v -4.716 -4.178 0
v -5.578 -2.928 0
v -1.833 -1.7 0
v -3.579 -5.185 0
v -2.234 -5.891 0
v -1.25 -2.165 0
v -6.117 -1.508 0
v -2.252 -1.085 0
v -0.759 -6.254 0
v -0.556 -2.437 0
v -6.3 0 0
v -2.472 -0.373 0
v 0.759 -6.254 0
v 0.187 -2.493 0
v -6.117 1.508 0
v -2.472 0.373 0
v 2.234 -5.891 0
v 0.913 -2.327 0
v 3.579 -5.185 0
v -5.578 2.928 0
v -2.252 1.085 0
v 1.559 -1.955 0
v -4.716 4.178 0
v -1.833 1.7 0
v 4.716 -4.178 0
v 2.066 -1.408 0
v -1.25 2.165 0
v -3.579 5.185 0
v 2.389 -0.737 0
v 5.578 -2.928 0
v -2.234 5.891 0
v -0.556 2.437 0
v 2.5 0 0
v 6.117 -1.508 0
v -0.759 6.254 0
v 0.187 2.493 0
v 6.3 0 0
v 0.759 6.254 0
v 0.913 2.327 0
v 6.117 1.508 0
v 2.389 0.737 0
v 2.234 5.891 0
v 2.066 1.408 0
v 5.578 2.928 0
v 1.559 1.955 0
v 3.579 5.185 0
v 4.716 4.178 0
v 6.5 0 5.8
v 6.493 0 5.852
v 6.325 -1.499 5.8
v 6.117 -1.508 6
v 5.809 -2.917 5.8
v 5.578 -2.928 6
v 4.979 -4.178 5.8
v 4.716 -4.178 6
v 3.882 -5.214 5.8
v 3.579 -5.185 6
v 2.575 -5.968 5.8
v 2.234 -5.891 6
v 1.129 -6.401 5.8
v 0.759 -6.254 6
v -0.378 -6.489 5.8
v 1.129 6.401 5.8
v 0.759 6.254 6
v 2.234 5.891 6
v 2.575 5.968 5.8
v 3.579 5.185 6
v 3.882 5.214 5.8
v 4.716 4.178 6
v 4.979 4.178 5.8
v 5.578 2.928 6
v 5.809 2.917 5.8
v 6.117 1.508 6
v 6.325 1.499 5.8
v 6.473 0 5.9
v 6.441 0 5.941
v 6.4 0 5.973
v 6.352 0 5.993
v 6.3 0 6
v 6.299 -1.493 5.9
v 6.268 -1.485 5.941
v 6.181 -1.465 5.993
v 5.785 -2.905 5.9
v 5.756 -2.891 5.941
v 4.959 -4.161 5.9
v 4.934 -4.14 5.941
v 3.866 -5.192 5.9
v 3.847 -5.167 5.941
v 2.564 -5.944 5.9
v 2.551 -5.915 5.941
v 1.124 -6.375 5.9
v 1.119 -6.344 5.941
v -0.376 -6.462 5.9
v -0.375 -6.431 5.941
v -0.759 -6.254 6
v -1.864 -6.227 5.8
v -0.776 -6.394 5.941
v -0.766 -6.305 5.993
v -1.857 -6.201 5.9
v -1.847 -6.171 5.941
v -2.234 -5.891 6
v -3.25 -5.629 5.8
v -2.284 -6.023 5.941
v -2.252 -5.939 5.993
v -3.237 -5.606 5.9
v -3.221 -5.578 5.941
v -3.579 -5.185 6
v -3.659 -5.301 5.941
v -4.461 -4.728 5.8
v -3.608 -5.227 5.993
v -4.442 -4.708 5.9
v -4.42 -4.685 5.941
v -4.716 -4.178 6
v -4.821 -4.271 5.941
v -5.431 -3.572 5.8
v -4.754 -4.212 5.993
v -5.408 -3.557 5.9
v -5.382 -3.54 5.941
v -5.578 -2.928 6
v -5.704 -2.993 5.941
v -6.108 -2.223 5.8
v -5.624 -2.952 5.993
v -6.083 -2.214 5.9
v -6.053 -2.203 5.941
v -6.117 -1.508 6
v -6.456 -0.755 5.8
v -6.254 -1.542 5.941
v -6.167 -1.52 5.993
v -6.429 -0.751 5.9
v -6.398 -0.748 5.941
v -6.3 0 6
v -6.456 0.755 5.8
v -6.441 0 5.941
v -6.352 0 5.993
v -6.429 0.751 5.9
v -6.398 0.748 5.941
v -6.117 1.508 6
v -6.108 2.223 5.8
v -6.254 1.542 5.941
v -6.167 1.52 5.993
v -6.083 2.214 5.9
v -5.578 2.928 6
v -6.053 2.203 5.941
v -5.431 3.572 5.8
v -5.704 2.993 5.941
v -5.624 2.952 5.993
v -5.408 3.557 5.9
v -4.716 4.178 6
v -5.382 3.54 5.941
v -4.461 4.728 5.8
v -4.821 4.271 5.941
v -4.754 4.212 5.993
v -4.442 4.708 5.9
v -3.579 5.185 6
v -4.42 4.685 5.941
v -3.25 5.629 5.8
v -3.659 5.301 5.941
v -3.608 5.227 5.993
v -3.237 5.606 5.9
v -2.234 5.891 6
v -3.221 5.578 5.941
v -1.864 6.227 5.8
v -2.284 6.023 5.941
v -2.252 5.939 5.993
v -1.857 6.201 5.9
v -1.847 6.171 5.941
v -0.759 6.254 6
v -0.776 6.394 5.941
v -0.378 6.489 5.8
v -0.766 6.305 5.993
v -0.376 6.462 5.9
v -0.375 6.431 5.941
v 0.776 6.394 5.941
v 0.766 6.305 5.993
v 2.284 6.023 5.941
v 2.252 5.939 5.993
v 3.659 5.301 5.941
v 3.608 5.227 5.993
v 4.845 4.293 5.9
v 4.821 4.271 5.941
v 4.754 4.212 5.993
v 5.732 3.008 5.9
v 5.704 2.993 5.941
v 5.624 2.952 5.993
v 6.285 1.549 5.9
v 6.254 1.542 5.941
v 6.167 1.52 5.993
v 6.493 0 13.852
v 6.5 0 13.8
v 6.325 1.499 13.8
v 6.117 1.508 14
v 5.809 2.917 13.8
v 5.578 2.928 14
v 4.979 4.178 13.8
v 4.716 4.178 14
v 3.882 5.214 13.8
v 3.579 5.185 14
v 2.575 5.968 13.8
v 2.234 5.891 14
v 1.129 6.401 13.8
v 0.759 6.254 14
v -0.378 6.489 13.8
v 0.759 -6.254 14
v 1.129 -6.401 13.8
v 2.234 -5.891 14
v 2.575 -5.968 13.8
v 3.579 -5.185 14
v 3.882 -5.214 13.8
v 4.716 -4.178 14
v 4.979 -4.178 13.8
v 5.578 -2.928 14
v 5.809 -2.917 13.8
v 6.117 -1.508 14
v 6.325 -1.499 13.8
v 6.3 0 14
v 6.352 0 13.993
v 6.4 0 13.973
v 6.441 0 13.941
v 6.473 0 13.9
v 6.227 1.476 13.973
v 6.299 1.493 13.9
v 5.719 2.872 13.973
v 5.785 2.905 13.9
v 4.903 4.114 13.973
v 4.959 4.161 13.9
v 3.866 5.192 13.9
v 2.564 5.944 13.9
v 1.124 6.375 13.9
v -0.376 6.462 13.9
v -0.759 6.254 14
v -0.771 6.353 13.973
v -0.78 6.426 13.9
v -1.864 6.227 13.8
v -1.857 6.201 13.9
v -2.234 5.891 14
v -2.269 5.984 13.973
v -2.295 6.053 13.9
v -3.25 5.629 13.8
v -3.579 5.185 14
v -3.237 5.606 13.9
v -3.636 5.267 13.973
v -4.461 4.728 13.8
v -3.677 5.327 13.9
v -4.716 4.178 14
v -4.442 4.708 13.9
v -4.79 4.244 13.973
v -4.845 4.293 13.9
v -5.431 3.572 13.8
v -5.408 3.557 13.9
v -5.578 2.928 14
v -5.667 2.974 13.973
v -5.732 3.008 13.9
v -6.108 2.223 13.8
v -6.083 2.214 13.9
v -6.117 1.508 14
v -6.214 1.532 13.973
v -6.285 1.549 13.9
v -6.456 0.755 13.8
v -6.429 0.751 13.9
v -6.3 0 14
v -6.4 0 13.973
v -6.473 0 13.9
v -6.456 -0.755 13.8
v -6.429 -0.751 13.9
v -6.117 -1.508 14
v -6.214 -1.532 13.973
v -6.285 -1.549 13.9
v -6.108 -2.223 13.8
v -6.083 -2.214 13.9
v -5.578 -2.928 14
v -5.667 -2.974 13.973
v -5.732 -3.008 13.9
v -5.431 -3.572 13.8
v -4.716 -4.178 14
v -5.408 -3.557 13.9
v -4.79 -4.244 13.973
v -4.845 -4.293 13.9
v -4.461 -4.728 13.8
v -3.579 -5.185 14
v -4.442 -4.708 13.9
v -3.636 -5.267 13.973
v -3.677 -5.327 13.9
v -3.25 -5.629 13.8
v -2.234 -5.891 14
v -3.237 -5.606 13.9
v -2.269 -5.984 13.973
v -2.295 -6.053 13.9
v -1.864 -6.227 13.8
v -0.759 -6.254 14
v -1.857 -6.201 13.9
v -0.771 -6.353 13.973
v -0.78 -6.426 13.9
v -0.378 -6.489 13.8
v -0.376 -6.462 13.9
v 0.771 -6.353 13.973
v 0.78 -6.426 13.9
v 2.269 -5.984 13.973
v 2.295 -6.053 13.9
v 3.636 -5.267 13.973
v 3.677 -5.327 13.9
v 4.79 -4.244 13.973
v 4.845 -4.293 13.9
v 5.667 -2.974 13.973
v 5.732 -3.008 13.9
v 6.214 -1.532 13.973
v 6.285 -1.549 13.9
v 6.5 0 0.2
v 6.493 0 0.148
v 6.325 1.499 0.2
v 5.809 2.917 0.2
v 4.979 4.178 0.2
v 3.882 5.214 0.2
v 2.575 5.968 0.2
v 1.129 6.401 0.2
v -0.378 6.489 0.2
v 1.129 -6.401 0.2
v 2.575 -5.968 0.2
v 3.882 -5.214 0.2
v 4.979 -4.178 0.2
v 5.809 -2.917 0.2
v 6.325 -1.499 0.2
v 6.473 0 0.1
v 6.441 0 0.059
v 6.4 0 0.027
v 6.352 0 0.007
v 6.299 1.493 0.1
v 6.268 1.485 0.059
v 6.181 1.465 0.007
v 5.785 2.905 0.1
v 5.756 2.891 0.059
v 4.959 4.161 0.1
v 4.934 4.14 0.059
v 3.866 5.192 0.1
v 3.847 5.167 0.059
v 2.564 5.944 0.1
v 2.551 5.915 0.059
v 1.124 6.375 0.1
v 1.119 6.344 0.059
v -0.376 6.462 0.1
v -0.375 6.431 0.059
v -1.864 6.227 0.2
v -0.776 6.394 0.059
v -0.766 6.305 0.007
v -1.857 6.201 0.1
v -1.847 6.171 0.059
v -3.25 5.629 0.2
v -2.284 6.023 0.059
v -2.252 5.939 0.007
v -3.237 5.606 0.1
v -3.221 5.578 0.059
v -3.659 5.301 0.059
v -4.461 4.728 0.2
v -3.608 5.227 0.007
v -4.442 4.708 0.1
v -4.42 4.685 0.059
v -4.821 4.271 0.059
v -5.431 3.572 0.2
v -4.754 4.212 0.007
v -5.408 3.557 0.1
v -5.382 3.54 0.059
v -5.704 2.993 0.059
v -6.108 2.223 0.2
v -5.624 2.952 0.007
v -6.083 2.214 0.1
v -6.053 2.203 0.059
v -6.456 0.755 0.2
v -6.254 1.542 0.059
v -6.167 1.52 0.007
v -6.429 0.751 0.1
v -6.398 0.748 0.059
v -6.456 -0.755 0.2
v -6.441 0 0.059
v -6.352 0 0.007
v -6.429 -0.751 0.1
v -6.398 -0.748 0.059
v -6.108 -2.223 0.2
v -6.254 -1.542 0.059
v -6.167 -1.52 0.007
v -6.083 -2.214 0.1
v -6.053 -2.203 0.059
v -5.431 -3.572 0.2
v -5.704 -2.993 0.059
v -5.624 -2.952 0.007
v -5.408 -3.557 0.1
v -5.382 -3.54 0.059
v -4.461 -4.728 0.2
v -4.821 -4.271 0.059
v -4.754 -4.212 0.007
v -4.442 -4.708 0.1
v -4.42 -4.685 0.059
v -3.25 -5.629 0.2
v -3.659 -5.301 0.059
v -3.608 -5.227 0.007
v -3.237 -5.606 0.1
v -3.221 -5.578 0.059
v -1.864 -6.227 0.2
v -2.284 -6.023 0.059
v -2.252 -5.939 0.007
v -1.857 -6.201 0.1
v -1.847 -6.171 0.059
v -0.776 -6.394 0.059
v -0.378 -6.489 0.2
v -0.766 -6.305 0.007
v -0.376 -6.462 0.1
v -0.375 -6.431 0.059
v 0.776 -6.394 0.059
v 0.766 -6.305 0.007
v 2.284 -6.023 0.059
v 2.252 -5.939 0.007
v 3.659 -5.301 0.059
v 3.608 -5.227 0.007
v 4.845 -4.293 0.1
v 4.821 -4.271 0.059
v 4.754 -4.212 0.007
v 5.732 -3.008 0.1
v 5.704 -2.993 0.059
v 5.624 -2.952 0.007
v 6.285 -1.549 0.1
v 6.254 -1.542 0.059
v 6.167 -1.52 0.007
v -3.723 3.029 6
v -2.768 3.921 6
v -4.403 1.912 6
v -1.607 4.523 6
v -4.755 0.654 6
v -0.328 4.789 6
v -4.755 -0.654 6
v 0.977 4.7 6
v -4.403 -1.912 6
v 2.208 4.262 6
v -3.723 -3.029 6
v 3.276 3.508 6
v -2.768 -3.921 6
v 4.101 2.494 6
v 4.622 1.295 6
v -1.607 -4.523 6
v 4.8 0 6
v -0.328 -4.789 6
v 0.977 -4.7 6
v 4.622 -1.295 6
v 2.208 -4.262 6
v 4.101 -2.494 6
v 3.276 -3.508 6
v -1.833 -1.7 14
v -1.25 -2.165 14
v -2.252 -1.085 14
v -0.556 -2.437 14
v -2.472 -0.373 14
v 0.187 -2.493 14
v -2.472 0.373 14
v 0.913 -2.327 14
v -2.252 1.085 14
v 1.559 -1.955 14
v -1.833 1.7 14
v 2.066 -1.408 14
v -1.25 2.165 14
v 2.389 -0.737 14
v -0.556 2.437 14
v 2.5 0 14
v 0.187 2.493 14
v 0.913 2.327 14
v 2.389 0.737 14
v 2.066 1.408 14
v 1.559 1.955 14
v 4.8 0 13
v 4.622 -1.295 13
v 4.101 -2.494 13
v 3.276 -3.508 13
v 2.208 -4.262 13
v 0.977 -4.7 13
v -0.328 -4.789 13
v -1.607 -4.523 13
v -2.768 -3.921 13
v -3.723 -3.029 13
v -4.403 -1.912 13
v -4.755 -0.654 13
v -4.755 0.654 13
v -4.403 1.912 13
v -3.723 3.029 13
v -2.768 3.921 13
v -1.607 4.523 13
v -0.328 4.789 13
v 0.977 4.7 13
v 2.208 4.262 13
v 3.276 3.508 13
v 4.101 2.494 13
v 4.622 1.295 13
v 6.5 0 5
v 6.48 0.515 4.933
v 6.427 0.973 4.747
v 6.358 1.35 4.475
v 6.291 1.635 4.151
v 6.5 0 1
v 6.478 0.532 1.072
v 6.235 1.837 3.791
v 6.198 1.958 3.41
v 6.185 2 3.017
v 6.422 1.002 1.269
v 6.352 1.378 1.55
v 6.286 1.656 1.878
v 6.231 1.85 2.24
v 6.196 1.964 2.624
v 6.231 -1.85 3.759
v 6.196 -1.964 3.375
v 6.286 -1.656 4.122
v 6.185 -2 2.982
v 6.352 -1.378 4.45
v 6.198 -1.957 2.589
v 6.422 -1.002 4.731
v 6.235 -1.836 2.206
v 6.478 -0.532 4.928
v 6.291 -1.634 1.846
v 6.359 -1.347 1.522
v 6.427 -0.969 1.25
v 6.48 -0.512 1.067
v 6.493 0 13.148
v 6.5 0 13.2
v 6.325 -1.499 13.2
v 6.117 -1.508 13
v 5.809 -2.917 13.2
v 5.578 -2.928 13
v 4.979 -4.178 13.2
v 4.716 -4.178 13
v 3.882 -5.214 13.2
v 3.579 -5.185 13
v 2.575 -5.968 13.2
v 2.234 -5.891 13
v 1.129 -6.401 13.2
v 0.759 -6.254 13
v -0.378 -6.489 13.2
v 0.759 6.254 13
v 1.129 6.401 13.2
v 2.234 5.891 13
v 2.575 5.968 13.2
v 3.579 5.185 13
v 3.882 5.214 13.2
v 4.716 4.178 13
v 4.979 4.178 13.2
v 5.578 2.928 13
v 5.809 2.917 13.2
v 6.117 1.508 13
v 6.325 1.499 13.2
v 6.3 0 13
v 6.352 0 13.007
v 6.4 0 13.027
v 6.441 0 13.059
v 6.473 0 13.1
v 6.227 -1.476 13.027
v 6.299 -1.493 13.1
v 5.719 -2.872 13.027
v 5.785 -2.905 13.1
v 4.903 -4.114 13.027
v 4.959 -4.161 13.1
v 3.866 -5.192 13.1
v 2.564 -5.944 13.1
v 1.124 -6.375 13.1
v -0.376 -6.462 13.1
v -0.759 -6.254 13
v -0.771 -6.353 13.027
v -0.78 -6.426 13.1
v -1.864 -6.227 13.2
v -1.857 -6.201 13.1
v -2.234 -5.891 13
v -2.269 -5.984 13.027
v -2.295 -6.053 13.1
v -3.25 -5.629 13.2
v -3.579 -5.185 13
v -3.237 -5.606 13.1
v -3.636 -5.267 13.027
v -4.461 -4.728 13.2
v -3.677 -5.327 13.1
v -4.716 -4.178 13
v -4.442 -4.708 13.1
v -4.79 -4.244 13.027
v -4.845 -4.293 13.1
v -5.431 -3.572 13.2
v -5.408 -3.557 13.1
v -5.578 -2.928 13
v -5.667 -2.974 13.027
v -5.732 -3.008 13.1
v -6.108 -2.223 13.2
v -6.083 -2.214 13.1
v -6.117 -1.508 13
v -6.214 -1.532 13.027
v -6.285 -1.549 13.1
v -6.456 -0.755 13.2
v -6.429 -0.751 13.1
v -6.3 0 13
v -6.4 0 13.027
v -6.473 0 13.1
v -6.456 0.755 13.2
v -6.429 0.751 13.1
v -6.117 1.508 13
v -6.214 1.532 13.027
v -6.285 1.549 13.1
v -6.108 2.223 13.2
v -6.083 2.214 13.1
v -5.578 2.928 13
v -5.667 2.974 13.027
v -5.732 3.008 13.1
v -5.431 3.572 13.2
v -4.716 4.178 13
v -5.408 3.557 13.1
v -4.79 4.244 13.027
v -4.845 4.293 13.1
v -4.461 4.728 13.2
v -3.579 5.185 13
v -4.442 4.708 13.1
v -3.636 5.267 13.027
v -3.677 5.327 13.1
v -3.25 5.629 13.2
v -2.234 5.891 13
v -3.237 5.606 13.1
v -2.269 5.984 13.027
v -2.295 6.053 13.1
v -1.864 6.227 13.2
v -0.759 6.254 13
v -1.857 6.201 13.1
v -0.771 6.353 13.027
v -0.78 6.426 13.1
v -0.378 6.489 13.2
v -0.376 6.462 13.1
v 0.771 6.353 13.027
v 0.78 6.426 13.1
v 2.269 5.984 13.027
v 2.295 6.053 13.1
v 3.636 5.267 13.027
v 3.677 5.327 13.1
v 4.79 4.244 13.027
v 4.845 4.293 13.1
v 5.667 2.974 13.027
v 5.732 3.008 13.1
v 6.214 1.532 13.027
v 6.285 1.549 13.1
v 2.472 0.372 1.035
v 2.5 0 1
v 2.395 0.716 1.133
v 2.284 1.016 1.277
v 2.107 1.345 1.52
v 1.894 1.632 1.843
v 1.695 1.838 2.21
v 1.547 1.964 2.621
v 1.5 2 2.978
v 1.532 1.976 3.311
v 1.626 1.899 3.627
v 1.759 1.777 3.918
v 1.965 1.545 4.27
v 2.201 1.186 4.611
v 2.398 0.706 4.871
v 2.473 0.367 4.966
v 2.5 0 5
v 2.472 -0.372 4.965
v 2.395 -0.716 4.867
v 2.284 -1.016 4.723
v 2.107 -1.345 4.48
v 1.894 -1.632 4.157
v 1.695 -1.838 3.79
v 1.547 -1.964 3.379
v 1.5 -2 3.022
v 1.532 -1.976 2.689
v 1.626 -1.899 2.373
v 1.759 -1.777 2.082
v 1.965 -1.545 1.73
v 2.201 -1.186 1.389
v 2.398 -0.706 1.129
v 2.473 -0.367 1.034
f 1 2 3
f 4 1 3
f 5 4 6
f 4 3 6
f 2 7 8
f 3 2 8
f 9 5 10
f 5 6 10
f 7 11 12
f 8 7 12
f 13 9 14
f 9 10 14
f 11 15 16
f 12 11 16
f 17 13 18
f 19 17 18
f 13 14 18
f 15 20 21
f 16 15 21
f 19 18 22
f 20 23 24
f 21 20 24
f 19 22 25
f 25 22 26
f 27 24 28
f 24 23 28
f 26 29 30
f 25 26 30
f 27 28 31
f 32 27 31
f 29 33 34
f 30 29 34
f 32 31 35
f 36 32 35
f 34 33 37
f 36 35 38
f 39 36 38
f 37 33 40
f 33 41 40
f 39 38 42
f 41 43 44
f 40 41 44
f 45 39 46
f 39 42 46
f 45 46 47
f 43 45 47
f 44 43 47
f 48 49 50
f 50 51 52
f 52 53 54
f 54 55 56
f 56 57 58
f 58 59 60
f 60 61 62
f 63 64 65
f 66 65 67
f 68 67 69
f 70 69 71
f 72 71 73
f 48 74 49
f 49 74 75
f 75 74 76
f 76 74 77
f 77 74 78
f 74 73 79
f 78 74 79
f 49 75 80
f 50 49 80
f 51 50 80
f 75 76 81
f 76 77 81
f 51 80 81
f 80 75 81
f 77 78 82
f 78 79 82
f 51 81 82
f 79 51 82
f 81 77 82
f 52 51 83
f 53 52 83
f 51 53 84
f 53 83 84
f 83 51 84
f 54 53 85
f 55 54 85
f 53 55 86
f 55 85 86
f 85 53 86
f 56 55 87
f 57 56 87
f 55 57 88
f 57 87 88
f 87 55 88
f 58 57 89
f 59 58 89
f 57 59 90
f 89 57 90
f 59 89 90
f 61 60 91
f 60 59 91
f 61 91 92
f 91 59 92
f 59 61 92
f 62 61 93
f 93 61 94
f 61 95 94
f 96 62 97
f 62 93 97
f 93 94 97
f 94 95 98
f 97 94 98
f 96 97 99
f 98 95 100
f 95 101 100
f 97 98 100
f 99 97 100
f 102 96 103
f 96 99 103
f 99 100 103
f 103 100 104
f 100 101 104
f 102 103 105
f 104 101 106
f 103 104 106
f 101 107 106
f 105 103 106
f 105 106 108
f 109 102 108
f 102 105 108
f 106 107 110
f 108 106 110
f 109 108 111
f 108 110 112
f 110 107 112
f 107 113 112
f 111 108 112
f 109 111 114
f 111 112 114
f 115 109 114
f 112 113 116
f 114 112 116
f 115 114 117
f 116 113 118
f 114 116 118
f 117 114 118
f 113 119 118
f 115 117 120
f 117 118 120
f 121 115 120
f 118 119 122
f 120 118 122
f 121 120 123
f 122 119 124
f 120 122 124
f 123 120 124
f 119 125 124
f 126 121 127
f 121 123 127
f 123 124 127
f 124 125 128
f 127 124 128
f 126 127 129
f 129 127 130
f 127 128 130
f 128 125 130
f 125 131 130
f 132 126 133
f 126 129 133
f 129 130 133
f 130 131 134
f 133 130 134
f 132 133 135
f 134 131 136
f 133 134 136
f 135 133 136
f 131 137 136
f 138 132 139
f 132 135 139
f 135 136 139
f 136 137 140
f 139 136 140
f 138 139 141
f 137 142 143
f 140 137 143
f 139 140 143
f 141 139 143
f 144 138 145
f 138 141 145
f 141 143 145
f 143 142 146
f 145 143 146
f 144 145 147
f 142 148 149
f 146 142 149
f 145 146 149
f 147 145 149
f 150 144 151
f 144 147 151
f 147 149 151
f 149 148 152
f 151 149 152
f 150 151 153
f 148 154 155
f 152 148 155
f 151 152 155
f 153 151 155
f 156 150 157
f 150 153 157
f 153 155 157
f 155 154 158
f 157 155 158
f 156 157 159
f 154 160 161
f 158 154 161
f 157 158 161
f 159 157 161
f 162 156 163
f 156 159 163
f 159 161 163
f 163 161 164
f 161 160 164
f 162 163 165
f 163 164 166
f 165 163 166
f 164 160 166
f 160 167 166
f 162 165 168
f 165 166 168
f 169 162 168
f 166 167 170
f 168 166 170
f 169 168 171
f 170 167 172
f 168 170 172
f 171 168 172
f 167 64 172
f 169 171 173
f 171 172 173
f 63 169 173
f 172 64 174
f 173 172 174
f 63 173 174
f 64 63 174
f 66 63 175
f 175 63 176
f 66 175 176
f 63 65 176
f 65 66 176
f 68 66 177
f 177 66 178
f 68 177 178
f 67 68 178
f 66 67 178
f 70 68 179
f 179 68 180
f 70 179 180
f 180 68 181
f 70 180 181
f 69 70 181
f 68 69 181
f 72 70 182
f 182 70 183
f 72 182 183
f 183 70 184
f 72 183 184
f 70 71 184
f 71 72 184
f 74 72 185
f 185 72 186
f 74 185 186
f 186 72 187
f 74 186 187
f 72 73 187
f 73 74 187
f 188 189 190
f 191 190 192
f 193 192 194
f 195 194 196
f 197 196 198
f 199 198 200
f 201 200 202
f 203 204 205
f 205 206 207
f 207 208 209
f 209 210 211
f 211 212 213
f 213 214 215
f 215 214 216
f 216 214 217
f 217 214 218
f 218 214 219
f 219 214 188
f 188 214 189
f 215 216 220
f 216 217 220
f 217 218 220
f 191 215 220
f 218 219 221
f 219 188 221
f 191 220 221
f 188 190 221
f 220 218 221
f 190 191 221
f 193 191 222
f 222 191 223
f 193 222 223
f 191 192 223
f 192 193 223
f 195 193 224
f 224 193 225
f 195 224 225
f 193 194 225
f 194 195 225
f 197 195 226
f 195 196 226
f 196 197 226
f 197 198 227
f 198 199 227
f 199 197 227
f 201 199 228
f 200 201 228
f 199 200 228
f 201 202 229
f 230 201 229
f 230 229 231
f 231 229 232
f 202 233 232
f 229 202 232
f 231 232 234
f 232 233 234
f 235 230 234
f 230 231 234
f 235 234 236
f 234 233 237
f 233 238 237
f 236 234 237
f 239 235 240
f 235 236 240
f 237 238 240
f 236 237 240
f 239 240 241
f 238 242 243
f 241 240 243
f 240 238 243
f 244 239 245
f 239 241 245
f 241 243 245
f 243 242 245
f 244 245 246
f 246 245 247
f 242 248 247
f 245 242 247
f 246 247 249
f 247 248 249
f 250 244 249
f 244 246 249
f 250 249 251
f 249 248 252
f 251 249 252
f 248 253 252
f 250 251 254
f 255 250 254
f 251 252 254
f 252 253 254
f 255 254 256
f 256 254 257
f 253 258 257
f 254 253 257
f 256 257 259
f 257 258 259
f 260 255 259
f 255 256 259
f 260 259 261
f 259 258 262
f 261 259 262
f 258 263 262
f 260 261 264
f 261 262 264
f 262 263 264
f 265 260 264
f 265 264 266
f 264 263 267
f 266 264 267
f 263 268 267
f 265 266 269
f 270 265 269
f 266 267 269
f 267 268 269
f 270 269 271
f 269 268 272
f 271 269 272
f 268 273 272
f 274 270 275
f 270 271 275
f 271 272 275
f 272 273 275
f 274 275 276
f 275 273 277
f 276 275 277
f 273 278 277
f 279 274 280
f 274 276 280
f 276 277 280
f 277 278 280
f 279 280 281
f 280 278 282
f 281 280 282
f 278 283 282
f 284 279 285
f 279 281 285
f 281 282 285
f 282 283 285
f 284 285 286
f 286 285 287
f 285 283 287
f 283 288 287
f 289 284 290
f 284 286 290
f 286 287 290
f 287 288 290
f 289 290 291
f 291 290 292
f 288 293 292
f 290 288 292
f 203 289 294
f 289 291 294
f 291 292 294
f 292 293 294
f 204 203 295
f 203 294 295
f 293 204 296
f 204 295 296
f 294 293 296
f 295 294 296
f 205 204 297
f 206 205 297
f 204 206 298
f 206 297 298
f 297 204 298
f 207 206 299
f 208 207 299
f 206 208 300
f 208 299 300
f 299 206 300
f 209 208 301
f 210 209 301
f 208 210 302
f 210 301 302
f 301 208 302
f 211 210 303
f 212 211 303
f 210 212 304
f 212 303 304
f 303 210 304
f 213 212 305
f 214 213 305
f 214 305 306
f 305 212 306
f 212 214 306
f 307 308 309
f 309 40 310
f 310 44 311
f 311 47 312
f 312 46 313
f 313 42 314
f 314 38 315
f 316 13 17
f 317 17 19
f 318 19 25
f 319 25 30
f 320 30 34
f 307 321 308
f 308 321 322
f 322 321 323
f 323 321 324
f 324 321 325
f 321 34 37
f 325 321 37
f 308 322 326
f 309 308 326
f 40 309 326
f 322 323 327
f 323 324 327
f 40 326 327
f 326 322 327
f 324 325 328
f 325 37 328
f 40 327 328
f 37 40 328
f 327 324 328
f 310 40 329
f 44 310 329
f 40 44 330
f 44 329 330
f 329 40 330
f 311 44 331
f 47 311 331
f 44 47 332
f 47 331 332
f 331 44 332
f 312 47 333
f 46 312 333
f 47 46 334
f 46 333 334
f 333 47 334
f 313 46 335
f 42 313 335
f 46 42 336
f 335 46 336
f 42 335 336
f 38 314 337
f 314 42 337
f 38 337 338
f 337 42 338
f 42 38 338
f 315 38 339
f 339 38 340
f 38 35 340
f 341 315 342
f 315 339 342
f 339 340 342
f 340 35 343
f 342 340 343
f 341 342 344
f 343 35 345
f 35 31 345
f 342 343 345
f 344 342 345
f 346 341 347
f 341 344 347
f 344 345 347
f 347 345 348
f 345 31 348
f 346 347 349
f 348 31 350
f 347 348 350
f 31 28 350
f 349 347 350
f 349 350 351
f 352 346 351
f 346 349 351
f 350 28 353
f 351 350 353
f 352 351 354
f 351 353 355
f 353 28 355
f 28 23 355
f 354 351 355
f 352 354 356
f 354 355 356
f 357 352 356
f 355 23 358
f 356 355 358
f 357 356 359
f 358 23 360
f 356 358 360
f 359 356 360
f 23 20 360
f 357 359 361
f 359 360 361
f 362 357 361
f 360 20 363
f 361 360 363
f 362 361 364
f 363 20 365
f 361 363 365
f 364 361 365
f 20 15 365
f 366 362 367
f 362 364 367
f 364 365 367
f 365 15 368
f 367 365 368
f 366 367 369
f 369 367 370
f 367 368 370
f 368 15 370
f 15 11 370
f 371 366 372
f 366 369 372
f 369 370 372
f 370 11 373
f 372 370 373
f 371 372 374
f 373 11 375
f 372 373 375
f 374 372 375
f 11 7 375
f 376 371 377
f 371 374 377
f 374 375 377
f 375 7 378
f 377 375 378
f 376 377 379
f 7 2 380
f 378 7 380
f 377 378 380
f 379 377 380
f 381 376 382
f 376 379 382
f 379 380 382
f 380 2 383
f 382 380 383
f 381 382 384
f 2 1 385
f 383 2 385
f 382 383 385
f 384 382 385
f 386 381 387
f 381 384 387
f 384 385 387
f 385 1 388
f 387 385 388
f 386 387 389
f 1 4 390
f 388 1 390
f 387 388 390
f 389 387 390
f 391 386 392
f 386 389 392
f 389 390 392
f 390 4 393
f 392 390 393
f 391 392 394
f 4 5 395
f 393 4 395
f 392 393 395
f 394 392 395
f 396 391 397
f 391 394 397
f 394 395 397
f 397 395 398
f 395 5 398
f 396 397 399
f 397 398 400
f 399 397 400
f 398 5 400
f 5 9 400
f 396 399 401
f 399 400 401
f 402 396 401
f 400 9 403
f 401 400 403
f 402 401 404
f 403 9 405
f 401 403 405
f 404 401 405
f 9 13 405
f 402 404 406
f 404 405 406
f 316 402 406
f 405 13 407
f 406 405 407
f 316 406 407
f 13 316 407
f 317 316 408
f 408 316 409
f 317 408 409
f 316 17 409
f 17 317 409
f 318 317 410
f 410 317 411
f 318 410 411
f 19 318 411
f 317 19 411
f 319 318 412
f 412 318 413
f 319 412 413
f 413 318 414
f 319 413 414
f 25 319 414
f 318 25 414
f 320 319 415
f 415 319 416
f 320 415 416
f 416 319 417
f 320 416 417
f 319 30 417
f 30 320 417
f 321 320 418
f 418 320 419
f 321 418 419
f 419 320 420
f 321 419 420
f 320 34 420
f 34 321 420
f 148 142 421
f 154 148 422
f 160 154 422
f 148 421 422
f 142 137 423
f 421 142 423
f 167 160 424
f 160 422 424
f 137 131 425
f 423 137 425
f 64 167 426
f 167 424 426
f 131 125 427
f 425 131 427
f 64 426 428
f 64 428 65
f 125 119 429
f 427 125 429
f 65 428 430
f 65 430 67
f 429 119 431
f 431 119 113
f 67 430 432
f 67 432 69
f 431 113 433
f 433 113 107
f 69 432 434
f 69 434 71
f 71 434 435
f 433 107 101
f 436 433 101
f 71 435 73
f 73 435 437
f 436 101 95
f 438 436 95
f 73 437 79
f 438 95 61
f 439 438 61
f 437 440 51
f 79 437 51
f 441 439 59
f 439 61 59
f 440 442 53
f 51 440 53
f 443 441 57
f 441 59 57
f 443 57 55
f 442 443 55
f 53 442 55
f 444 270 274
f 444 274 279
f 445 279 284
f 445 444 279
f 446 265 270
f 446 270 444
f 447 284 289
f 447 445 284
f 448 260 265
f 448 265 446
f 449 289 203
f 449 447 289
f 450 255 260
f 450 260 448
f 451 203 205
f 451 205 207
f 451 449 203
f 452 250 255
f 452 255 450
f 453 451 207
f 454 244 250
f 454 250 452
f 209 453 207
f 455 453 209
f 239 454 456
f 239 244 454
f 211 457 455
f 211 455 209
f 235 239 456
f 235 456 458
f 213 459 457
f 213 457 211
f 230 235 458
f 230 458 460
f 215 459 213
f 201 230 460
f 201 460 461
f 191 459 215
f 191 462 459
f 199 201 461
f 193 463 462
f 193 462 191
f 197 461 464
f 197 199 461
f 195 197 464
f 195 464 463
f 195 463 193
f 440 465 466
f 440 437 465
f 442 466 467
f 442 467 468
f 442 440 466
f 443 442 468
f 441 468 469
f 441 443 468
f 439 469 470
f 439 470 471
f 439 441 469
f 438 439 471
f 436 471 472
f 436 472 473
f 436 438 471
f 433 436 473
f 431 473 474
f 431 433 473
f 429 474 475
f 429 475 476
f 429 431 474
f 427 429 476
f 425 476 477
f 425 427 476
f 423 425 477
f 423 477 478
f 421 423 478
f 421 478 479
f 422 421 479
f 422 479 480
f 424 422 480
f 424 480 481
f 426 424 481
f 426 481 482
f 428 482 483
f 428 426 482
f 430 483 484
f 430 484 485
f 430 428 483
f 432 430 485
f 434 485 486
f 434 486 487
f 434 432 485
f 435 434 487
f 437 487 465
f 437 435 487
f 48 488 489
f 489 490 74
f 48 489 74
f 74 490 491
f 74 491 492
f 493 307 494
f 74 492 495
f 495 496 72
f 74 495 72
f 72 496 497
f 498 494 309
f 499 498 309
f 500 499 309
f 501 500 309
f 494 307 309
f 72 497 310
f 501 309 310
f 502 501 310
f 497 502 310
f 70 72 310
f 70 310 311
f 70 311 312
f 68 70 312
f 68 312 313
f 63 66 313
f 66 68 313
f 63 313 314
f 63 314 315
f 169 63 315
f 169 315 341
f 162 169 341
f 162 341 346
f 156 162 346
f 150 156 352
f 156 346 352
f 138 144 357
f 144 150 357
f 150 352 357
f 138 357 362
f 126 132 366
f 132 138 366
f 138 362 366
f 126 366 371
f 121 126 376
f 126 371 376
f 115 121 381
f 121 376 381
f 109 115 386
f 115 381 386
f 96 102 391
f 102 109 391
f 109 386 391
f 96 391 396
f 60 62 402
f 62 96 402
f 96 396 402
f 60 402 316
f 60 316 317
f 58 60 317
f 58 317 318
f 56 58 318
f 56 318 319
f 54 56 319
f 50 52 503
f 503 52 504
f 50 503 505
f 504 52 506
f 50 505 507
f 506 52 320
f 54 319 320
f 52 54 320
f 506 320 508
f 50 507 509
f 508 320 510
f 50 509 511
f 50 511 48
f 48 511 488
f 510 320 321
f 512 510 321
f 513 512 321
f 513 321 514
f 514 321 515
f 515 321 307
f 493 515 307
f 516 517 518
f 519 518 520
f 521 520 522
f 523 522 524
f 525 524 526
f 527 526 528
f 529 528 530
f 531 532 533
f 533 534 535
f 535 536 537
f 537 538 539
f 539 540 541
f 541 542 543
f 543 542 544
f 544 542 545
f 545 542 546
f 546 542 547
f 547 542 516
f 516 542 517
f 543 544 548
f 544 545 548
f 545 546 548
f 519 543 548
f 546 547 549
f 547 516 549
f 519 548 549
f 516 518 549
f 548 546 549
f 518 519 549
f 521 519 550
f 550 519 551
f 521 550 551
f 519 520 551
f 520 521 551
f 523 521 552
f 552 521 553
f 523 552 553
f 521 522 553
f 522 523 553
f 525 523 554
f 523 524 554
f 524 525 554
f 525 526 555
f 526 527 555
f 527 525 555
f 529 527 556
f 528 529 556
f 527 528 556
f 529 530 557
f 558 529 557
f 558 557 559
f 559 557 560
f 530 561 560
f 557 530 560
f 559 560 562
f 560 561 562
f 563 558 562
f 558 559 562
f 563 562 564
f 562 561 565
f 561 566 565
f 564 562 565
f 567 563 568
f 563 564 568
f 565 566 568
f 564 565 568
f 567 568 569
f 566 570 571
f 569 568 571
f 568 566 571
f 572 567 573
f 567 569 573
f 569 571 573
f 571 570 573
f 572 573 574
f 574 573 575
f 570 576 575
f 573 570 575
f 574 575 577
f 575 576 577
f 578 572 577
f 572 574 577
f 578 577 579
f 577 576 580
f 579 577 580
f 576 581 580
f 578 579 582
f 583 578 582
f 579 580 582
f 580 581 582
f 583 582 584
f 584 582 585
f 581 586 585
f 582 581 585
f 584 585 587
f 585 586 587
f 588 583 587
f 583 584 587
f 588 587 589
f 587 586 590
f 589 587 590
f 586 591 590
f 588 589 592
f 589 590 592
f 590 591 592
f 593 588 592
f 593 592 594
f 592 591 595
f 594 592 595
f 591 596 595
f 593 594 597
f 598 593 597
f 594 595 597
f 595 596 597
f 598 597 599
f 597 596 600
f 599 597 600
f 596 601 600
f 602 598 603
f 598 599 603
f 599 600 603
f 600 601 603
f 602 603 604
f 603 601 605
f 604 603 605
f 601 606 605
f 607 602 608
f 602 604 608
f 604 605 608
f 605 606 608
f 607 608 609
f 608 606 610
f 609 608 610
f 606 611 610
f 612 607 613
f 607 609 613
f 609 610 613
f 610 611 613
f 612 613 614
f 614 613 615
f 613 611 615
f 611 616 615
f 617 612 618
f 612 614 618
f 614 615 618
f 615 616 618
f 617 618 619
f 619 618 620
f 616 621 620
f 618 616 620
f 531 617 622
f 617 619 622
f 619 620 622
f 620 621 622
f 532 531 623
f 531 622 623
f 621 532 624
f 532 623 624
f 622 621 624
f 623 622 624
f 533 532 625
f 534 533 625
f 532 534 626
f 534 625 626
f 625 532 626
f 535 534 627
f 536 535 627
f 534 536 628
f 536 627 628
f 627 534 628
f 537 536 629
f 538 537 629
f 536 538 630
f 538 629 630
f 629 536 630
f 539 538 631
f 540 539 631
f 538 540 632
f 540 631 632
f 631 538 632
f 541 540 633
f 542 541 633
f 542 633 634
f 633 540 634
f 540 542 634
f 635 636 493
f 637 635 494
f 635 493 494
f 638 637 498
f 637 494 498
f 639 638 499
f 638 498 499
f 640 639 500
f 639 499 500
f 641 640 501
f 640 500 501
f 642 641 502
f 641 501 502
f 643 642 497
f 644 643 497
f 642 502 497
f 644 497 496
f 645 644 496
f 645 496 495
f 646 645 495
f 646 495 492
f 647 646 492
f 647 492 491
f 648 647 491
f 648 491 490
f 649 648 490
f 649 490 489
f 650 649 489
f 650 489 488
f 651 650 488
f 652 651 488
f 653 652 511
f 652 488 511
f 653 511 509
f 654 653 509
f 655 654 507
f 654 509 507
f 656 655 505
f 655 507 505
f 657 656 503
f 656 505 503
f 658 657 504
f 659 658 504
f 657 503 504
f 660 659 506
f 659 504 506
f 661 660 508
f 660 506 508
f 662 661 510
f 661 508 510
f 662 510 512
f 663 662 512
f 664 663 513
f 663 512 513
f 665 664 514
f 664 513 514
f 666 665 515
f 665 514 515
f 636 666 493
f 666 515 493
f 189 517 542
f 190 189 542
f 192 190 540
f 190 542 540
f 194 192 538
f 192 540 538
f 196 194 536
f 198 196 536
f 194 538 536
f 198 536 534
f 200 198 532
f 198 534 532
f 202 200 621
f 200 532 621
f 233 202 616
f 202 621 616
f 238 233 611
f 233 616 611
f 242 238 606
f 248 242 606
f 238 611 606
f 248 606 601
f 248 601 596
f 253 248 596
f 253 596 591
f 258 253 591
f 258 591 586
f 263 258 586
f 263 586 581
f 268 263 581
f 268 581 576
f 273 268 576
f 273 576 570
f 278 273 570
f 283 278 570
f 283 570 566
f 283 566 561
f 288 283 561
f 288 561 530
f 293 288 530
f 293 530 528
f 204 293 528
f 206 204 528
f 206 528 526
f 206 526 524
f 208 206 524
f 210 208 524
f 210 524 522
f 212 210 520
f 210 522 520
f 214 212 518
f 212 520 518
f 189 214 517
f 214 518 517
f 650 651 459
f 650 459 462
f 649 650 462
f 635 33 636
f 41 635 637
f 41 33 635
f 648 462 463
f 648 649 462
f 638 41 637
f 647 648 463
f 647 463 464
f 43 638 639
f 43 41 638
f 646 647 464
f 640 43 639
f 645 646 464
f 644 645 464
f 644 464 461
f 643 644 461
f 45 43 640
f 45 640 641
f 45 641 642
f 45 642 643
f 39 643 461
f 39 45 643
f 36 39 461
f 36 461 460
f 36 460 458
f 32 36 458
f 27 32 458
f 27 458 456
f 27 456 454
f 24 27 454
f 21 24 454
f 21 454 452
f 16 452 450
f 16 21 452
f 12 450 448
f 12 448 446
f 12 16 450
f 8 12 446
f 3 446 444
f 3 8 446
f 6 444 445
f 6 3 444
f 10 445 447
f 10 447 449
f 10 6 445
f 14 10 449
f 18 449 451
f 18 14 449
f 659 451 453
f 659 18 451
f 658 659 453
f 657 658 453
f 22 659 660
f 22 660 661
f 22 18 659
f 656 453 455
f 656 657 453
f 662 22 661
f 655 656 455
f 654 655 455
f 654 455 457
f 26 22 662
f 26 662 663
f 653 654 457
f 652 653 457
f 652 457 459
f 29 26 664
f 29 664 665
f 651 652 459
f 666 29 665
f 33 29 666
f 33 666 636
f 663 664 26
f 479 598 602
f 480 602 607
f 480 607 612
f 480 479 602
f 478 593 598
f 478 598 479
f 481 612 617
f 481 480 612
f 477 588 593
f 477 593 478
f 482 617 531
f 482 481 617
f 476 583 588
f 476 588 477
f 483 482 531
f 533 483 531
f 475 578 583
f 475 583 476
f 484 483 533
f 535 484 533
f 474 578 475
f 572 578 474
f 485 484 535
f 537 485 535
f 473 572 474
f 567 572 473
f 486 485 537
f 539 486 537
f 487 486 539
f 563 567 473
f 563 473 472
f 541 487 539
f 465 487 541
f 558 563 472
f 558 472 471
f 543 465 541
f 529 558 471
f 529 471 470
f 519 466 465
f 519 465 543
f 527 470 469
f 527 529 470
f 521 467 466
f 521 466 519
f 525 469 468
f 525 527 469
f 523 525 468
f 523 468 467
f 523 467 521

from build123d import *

# Parameters (mm, degrees)
SKETCH1_R           = 6.5
SKETCH1_R_2         = 2.5
BOSS_EXTRUDE1_DEPTH = 14
SKETCH2_W           = 7
SKETCH2_H           = 4.416086924
FILLET2_R           = 0.2
SKETCH4_R           = 2
CUT_EXTRUDE1_DEPTH  = 6


with BuildPart() as part:
    # Sketch1 → Boss-Extrude1 (new body)
    with BuildSketch(Plane.XY):
        Circle(SKETCH1_R)
        Circle(SKETCH1_R_2, mode=Mode.SUBTRACT)
    extrude(amount=BOSS_EXTRUDE1_DEPTH)

    # Sketch2 → Cut-Revolve1 (revolve, cut)
    with BuildSketch(Plane(origin=(0, 0, 0), x_dir=(0, 0, -1), z_dir=(1, 0, 0)), mode=Mode.PRIVATE) as cut_revolve1_sk:
        with Locations((-9.5, -7.008043462)):
            Rectangle(SKETCH2_W, SKETCH2_H)
    revolve(cut_revolve1_sk.sketch.rotate(Axis((0, 0, 15.643909914), (0, 0, -1)), 270), axis=Axis((0, 0, 15.643909914), (0, 0, -1)), mode=Mode.SUBTRACT)

    # Fillet2
    fillet2_edges = [part.edges().sort_by_distance(p)[0] for p in [
        (-6.5, 0, 13),
        (-6.5, 0, 6),
        (-6.5, 0, 0),
        (-6.5, 0, 14),
    ]]
    fillet(fillet2_edges, radius=FILLET2_R)

    # Sketch4 → Cut-Extrude1 (cut)
    with BuildSketch(Plane(origin=(6.5, 0, 0), x_dir=(0, 0, -1), z_dir=(1, 0, 0))):
        with Locations((-3, 0)):
            Circle(SKETCH4_R)
    extrude(amount=-CUT_EXTRUDE1_DEPTH, mode=Mode.SUBTRACT)


solid = part.part
